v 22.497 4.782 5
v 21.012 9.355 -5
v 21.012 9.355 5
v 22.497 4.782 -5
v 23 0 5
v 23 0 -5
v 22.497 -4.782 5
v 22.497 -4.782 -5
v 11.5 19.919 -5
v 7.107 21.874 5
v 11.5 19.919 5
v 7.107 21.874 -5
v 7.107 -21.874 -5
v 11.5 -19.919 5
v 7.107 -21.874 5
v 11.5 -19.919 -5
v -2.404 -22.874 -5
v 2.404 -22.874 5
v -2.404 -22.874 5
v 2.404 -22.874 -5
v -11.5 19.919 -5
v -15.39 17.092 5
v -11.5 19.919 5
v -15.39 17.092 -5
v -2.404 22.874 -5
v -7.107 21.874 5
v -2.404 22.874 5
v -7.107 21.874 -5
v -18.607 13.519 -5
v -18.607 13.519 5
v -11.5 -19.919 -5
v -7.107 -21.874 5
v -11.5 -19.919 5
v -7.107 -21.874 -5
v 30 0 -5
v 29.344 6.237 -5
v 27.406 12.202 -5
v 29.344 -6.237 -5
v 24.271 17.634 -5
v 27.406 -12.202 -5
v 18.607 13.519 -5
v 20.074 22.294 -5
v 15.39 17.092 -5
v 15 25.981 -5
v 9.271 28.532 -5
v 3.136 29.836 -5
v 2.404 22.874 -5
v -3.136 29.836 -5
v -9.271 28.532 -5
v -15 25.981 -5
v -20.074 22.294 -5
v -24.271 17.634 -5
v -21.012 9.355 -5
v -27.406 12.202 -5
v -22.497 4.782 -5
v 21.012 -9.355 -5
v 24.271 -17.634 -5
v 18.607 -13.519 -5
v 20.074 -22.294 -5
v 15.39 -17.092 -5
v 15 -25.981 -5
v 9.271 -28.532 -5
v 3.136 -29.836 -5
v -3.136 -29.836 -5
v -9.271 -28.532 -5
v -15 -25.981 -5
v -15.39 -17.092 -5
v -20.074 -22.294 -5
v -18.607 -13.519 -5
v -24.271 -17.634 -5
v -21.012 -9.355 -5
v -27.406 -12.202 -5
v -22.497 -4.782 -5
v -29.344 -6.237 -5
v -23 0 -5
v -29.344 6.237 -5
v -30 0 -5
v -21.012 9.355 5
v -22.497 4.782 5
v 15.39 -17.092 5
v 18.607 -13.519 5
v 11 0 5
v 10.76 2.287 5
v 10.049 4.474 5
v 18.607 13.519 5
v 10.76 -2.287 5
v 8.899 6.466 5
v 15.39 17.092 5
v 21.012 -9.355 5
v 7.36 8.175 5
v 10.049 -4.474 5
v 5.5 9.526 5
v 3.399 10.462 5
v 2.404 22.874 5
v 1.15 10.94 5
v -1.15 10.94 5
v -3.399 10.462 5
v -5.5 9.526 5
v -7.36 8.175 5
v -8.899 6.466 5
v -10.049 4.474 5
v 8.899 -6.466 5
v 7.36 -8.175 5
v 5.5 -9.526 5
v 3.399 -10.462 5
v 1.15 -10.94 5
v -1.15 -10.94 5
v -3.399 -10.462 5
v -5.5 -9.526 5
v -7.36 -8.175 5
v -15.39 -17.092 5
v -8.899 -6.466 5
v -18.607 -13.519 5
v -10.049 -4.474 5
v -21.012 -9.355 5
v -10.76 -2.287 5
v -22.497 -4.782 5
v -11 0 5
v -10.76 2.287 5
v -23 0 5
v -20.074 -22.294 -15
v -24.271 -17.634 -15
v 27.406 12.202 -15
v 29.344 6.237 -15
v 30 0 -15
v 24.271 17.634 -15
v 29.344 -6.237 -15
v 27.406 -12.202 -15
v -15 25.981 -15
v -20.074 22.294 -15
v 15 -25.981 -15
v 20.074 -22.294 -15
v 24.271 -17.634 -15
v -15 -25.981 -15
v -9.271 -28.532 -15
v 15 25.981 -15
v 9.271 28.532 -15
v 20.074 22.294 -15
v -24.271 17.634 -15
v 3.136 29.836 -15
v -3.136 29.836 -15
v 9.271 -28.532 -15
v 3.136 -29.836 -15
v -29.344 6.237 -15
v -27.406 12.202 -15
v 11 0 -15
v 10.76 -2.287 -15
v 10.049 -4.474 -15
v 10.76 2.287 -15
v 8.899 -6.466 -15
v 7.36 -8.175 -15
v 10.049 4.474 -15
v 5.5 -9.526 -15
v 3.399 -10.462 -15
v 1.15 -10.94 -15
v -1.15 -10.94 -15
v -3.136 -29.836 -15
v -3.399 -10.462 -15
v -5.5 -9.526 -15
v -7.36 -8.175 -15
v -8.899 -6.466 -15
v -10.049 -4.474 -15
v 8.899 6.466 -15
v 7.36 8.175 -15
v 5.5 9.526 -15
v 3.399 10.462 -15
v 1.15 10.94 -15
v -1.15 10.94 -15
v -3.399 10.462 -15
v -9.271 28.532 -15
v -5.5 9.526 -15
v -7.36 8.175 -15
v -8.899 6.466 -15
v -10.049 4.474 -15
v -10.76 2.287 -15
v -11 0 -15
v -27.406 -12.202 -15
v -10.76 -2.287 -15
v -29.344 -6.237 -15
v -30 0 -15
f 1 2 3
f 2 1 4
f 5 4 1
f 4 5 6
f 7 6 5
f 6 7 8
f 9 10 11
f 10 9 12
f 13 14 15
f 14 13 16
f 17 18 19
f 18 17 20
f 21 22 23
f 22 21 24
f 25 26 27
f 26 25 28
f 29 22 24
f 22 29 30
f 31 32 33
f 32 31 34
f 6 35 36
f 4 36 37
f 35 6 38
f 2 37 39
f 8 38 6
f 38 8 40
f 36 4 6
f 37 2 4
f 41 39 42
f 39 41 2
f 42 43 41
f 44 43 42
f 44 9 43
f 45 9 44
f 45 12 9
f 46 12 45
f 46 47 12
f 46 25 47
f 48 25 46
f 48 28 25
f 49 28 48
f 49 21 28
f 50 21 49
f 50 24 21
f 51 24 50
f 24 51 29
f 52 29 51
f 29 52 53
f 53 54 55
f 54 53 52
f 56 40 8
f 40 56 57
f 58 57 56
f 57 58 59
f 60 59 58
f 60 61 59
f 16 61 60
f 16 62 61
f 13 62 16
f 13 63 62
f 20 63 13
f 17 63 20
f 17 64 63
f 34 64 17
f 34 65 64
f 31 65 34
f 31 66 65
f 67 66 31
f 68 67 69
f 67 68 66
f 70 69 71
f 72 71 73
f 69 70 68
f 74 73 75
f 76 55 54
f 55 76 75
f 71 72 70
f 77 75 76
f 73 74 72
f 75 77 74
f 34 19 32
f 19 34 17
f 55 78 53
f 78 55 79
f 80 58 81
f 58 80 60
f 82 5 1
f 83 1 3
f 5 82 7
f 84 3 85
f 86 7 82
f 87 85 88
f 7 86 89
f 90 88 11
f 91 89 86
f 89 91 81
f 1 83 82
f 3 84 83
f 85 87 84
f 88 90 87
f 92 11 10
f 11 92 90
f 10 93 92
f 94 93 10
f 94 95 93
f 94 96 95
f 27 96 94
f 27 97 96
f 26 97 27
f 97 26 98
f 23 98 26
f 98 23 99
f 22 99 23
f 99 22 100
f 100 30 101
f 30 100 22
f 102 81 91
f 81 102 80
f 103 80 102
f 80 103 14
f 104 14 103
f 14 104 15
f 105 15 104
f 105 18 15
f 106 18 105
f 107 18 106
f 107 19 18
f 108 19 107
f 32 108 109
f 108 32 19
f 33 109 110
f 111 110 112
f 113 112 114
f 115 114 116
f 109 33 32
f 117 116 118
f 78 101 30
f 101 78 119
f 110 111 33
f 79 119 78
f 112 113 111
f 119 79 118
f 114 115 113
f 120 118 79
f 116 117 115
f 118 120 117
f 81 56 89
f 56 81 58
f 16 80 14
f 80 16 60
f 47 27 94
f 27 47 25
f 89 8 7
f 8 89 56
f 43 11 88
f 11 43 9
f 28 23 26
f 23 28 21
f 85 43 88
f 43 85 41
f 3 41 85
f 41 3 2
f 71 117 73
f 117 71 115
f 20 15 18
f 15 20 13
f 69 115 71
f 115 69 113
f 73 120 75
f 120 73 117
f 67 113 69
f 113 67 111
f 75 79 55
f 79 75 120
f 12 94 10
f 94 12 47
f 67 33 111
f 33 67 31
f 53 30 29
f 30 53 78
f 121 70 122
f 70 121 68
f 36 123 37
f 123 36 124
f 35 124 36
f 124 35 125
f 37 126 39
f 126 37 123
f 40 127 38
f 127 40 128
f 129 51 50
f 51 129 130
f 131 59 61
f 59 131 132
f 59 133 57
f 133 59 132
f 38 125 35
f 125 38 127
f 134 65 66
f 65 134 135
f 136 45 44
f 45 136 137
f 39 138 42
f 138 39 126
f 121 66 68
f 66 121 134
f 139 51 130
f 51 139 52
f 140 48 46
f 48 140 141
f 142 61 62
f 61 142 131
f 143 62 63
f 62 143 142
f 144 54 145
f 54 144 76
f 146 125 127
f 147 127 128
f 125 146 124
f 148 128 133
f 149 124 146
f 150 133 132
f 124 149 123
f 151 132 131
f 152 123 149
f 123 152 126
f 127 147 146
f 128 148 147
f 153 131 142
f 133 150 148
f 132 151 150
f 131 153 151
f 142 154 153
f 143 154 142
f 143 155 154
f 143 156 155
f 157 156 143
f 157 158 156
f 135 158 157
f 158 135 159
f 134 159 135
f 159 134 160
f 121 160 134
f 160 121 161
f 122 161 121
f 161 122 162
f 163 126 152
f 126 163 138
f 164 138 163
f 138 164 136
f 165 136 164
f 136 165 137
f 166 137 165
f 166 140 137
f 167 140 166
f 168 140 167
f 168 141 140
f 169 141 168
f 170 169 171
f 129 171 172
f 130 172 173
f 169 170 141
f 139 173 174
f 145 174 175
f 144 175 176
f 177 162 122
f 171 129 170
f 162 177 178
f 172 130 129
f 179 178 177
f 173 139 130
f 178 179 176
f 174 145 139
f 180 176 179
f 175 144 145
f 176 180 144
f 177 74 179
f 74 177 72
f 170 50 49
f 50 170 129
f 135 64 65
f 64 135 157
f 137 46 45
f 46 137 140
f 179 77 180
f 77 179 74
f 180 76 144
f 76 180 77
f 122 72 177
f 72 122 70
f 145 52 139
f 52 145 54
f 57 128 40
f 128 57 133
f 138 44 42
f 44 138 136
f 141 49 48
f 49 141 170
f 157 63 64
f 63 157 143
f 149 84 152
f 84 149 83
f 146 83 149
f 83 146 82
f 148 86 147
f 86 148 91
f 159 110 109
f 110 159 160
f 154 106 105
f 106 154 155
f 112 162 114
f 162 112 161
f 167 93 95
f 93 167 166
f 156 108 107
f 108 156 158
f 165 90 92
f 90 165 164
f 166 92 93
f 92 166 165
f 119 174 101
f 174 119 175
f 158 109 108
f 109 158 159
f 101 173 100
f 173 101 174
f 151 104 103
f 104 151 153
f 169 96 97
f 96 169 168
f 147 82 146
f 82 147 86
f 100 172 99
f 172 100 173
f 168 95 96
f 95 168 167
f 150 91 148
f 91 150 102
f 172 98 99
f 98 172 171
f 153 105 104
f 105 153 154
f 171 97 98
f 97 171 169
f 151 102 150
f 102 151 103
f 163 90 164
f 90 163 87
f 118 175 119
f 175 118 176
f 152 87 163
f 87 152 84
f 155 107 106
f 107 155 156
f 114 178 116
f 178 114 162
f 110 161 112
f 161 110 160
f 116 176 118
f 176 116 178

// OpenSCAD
difference()
{
	union ()
	{
		cylinder(10, 23, 23, center=true);
		translate ([0,0,-15])cylinder(10, 30, 30);
	}
	translate ([0,0,-15]) cylinder (20,11,11);
}
